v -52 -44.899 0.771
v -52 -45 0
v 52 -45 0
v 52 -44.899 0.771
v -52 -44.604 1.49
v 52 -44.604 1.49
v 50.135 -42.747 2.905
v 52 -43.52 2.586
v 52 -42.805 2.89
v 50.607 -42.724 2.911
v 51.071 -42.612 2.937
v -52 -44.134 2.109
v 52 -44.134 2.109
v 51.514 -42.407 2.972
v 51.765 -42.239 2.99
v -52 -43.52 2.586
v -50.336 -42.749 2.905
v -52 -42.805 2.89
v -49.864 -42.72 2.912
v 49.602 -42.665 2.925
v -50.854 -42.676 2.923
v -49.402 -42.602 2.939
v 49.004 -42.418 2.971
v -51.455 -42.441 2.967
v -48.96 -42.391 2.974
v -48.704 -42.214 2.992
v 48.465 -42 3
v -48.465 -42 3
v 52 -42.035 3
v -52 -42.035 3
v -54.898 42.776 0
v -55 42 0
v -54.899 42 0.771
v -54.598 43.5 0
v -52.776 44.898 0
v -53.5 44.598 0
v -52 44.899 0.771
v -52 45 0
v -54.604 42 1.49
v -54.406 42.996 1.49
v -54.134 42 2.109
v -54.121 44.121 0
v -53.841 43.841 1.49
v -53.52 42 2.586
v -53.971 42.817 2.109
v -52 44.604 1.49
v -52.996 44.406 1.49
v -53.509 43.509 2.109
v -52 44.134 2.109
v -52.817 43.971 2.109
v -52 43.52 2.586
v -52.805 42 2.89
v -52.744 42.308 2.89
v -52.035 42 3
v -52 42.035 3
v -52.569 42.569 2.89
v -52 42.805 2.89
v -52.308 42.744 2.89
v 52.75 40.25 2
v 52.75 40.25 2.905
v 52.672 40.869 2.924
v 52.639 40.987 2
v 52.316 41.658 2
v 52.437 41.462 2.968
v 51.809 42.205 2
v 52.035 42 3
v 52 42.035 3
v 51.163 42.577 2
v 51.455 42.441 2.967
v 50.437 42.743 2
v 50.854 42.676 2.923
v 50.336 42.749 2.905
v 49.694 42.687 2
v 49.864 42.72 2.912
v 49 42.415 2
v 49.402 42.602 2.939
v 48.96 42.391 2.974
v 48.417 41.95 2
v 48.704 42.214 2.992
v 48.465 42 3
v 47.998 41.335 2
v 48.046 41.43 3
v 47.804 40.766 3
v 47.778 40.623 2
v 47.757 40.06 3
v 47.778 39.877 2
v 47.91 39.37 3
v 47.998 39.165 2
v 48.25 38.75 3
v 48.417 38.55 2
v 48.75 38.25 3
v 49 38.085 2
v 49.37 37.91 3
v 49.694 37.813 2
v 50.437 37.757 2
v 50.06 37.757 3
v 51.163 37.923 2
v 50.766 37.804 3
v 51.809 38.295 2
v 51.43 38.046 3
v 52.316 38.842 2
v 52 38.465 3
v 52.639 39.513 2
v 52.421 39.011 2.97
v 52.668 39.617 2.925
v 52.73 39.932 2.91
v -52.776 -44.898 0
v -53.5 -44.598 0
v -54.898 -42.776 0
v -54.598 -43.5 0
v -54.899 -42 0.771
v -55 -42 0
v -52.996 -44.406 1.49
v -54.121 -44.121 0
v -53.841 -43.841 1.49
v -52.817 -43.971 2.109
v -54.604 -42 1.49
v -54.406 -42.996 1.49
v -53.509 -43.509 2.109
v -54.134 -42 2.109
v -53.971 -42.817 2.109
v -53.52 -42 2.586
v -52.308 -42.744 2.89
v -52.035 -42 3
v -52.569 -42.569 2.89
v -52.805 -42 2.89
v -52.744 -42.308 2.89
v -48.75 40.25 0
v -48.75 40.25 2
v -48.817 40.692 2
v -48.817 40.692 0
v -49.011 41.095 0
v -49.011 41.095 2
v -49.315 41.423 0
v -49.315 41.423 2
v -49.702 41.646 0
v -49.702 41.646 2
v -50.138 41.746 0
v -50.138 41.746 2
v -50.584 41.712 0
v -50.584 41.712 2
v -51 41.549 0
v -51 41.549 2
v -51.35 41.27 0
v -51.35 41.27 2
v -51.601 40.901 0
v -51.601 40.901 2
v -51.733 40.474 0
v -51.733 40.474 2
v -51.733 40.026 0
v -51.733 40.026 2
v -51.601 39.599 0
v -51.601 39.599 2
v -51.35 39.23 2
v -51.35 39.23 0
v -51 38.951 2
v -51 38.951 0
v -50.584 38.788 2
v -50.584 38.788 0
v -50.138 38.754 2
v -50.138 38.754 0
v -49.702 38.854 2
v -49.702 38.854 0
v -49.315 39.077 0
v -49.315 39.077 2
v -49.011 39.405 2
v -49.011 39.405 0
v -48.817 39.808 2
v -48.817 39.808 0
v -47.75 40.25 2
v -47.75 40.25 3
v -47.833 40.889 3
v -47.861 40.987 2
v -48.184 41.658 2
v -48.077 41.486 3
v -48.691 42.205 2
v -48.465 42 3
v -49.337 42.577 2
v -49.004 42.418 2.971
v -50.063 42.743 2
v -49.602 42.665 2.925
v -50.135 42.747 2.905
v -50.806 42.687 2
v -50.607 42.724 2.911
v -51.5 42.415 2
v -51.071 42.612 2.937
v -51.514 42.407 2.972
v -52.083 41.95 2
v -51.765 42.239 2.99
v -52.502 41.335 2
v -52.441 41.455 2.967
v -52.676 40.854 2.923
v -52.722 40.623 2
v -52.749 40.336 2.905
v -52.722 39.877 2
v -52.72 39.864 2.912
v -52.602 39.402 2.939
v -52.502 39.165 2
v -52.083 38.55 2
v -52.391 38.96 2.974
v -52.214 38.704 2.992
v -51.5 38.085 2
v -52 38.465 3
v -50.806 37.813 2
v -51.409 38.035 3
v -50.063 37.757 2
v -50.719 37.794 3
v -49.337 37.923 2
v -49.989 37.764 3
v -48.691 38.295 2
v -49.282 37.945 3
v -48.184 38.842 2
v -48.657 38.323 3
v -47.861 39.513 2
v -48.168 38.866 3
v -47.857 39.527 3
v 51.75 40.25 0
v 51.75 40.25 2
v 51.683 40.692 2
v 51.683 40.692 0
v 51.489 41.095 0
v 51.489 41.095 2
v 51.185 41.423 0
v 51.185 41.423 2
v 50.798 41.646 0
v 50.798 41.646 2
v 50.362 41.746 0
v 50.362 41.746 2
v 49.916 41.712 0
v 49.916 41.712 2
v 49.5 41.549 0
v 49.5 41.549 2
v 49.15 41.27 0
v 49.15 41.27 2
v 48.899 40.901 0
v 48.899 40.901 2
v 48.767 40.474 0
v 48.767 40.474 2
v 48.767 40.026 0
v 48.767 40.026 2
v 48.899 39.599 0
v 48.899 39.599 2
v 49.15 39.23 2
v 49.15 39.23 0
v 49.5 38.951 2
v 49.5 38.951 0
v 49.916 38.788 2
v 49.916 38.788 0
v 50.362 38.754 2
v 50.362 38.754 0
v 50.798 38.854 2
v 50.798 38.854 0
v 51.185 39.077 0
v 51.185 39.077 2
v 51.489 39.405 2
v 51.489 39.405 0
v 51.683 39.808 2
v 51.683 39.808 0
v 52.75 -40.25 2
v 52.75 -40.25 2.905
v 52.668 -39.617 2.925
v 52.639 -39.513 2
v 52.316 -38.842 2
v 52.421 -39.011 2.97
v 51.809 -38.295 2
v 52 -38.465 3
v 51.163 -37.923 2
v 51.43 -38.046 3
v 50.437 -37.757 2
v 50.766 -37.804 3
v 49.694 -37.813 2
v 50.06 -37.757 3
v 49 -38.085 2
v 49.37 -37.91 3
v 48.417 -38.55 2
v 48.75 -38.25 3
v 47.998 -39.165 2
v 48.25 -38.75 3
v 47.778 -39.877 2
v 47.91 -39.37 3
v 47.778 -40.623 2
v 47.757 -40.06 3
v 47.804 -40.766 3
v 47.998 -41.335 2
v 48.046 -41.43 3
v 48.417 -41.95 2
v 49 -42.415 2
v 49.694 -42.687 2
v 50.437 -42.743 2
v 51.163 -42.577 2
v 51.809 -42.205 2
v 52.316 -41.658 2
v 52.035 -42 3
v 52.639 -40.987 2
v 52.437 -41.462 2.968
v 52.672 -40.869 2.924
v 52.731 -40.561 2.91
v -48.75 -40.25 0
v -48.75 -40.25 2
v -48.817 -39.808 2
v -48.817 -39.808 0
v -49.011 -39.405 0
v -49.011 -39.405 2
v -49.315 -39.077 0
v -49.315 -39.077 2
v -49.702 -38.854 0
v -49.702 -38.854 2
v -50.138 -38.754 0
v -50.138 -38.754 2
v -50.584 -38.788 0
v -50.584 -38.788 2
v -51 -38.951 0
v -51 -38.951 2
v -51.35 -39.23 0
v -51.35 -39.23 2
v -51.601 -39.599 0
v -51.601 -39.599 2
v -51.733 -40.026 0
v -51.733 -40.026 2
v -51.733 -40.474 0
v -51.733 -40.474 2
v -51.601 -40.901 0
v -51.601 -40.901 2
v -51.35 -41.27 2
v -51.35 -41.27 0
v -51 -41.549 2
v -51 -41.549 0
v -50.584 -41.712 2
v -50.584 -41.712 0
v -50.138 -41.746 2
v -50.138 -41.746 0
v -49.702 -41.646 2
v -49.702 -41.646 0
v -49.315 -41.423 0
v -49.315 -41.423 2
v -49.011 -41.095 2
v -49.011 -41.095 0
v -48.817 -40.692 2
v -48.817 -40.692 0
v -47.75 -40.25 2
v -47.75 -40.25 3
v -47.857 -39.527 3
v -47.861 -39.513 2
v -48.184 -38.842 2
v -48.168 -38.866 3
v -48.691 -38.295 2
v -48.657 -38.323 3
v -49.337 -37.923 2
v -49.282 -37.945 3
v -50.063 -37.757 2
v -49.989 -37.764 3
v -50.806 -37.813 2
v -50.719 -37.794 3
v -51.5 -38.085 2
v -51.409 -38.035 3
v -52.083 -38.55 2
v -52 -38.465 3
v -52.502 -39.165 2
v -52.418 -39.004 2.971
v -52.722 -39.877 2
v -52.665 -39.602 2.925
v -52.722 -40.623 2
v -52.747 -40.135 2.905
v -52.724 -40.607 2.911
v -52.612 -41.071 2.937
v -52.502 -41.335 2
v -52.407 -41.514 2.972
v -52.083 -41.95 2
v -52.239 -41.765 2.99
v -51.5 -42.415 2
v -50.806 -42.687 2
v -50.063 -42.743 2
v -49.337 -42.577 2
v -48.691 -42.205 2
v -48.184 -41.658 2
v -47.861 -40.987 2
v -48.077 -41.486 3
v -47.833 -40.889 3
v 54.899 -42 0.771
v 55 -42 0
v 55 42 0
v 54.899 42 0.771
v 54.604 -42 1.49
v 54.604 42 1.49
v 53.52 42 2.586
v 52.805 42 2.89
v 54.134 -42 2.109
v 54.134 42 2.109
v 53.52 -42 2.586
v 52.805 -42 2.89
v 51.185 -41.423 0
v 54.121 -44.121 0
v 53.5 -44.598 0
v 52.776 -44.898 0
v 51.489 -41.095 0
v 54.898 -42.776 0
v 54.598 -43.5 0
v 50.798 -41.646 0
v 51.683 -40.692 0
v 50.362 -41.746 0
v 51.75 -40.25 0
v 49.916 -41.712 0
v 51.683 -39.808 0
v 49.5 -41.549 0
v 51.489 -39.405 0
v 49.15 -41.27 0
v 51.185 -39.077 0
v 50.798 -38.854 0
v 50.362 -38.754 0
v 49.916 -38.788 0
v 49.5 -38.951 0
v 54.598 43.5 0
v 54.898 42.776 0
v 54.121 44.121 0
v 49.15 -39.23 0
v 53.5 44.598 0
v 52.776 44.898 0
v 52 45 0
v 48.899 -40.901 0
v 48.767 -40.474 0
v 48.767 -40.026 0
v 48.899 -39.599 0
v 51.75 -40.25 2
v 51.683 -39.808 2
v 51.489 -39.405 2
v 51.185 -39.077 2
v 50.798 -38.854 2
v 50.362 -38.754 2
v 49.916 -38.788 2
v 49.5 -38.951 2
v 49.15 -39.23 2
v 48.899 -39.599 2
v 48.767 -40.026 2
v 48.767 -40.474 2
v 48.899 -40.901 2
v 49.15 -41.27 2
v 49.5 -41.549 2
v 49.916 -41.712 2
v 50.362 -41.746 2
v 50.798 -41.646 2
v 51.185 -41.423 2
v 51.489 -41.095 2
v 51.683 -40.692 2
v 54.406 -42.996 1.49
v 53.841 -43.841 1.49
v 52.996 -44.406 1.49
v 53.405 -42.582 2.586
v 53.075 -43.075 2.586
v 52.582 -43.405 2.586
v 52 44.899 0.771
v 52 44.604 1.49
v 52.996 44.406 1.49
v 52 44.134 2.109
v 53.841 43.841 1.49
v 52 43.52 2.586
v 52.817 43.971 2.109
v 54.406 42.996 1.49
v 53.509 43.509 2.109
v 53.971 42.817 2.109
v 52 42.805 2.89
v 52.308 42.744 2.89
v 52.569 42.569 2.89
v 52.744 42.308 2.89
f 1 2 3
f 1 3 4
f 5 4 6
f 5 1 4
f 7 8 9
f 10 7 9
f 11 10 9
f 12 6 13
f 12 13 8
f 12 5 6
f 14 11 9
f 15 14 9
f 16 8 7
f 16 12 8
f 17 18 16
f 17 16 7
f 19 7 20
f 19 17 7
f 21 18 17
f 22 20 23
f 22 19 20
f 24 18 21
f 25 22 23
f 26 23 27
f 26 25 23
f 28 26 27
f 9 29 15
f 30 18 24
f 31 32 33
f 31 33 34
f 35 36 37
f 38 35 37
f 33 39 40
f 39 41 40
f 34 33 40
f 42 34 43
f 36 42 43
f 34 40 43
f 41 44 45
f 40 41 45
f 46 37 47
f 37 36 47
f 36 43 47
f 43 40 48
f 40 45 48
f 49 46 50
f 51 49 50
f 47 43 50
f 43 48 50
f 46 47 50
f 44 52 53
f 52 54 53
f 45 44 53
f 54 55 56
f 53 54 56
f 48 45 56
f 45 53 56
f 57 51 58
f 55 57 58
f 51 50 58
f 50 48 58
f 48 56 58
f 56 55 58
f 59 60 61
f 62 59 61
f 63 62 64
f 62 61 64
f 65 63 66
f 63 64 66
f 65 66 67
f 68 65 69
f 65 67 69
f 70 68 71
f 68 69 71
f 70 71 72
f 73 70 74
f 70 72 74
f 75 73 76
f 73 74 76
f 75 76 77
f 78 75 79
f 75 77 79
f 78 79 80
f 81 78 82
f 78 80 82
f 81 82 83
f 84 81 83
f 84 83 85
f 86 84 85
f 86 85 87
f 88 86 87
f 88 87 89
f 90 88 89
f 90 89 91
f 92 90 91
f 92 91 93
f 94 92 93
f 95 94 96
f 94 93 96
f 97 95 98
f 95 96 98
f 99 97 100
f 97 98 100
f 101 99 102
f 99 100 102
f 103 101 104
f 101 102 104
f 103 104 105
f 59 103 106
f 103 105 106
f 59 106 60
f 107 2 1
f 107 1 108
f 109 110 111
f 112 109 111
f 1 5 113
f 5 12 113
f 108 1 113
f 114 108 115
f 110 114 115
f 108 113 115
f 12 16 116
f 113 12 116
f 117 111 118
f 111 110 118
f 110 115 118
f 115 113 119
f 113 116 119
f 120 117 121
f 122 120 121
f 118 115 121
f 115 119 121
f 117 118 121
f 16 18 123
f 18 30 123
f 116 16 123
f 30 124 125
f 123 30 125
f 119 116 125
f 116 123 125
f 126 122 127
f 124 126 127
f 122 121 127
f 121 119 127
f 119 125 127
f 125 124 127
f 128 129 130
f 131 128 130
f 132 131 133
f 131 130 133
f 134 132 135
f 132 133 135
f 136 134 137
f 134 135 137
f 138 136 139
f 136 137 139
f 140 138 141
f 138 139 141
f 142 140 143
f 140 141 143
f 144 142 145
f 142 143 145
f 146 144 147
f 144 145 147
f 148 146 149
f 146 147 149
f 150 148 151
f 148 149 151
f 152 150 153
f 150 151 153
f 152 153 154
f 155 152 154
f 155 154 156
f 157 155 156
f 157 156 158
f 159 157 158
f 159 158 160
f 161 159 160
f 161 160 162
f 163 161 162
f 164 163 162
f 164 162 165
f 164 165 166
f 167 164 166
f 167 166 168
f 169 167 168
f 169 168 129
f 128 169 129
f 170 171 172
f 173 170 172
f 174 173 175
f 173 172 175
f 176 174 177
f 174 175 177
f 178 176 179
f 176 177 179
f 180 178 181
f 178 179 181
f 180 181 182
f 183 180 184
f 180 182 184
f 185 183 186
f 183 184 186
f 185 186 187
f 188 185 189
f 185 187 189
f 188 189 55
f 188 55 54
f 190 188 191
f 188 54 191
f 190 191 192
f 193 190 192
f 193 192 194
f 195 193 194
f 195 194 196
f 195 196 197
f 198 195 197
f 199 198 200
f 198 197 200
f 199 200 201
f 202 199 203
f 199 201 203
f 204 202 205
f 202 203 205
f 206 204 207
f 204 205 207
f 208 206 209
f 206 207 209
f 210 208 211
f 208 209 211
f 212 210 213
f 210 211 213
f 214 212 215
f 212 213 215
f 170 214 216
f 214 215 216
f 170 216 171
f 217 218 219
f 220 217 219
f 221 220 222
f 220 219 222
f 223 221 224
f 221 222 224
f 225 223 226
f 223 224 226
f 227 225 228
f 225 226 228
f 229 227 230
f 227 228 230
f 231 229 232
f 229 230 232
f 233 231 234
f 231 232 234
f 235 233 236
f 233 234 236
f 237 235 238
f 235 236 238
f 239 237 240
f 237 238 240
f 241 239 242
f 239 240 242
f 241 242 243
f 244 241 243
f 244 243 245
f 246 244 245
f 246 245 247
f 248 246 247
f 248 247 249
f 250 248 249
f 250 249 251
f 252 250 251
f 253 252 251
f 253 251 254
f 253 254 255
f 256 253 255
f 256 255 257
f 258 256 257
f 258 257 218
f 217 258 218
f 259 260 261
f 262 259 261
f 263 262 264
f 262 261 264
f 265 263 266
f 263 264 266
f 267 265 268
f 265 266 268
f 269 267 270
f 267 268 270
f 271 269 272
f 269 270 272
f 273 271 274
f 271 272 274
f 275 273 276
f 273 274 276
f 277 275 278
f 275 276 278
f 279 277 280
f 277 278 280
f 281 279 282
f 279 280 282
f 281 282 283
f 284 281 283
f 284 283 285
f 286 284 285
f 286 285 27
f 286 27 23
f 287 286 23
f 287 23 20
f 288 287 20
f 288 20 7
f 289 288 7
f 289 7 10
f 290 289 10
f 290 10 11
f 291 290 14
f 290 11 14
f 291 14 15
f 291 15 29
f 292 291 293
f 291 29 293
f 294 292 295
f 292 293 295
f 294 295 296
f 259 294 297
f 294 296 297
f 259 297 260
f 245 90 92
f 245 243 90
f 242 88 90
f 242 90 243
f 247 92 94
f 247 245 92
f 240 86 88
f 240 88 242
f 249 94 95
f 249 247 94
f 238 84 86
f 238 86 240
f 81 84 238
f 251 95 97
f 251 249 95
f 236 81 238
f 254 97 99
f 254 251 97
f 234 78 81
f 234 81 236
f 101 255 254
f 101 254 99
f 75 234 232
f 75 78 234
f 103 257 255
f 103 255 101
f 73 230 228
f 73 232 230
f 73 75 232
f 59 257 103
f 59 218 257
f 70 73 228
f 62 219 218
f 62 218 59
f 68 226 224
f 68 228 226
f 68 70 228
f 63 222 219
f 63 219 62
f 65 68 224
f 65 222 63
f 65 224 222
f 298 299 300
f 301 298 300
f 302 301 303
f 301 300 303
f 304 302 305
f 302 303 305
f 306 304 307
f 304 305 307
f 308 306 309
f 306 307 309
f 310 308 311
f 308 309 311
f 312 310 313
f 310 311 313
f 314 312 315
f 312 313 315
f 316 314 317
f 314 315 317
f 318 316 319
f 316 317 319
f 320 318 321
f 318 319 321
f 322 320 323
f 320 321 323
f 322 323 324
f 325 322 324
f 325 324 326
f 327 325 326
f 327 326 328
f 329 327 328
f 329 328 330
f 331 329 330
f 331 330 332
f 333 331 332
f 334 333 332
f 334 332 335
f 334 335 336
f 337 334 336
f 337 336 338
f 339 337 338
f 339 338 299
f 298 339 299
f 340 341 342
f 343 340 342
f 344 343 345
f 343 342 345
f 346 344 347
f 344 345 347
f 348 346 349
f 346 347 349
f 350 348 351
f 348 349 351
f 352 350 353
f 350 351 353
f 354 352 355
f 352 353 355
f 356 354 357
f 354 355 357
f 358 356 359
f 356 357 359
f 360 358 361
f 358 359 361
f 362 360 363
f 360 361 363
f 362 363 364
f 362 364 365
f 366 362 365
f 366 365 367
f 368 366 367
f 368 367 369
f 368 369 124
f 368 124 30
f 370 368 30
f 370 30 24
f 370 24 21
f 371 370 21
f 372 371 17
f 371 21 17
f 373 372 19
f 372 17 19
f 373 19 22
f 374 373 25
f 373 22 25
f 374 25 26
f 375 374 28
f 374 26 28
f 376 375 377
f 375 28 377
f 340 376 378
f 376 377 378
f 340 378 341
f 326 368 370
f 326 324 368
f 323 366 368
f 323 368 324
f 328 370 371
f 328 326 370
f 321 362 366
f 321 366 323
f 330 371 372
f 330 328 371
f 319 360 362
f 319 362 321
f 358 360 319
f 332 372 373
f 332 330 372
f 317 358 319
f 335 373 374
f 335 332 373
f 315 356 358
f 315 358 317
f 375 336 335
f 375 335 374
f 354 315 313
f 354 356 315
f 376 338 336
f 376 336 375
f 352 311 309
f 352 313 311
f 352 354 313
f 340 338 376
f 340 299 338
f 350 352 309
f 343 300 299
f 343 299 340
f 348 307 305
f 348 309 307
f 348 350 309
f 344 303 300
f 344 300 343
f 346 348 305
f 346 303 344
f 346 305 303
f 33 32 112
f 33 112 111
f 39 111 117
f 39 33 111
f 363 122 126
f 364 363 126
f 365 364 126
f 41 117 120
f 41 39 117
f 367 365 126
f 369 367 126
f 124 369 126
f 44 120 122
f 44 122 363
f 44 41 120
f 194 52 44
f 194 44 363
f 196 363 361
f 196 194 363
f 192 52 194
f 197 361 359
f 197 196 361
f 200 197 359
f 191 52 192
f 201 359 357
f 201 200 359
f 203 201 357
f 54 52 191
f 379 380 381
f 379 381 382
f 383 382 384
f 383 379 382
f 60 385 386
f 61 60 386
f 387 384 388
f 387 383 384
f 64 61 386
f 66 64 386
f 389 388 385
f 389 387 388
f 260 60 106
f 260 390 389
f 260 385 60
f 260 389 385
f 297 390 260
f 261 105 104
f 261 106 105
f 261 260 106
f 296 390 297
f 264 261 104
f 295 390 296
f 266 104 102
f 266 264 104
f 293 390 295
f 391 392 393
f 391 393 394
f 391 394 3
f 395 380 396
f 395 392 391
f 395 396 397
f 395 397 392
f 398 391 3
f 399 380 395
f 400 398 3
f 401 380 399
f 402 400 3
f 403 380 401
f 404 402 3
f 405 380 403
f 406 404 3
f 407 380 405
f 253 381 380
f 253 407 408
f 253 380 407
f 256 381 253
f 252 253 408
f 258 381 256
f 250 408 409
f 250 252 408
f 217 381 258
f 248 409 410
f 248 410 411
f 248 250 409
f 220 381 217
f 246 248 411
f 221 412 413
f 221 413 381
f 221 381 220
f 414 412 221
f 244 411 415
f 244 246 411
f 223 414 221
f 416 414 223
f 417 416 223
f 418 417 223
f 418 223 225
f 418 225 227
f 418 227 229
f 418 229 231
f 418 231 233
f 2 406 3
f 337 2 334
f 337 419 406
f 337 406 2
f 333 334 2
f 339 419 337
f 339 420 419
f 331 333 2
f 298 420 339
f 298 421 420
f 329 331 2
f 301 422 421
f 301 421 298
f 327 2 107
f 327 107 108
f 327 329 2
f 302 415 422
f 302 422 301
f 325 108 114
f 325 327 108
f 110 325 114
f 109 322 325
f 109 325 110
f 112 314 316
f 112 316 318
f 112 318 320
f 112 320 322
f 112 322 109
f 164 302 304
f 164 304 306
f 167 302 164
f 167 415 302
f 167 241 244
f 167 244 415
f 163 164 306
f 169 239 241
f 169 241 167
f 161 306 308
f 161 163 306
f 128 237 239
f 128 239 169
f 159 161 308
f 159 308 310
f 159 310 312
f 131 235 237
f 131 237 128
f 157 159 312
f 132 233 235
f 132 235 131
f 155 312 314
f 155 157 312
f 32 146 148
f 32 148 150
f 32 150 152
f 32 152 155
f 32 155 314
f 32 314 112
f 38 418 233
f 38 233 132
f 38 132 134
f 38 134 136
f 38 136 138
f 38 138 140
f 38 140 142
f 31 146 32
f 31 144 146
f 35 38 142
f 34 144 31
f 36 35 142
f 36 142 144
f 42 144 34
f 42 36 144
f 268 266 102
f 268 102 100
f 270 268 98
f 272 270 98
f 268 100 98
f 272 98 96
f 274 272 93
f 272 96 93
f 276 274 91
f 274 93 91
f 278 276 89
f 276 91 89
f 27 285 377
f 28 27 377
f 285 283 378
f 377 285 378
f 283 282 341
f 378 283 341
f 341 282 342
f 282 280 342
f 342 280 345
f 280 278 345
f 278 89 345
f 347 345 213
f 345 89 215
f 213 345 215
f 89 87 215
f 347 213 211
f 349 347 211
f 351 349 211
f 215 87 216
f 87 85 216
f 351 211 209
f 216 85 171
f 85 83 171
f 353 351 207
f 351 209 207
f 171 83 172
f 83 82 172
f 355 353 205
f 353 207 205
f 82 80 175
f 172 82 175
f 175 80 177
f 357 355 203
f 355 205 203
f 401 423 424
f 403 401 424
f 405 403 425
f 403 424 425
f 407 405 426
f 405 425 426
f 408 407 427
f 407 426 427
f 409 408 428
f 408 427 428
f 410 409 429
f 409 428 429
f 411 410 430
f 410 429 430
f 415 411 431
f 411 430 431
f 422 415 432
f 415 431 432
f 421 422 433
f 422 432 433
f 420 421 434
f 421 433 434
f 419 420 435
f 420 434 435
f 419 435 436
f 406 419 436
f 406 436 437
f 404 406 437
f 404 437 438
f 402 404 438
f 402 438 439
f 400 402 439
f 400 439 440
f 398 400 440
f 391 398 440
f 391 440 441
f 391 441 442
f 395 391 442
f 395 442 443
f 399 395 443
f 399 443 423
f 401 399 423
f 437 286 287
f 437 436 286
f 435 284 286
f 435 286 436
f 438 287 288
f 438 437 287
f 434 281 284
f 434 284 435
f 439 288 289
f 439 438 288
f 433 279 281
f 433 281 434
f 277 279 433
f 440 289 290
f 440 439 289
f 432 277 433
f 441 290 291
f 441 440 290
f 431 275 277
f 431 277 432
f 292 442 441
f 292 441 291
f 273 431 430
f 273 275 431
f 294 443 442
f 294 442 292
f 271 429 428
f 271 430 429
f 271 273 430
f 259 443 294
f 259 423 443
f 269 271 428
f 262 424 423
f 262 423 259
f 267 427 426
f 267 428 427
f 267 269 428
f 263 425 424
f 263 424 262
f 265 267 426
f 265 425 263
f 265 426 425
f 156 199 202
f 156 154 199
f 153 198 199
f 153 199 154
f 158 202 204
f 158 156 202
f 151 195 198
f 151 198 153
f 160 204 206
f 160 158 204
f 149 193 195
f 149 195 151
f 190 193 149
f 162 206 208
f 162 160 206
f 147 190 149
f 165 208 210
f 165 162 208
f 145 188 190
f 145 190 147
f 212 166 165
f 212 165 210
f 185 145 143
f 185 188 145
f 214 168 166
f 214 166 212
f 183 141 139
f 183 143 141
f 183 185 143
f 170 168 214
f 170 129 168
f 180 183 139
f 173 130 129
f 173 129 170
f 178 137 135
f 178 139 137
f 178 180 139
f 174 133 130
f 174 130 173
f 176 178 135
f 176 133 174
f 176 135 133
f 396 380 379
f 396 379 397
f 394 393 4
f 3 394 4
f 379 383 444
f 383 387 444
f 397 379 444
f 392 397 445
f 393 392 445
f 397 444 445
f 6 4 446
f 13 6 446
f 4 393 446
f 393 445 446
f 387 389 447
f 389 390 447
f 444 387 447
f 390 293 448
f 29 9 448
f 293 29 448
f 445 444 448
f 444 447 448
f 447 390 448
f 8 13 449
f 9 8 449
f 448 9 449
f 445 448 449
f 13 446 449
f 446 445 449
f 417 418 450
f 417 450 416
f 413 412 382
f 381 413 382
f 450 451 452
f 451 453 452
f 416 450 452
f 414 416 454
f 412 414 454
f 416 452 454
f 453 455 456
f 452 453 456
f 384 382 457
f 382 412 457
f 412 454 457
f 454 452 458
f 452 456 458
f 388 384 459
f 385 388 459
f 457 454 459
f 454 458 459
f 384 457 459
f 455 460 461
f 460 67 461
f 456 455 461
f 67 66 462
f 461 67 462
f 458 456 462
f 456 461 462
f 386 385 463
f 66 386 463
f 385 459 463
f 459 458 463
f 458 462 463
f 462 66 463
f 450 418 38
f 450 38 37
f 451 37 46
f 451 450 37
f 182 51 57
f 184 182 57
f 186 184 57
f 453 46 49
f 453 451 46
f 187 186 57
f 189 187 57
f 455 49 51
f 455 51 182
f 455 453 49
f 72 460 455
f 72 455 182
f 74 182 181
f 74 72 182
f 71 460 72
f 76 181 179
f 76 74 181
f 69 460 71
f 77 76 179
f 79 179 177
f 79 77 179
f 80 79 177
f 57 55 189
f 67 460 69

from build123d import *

# Parameters (mm, degrees)
BOSS_EXTRUDE1_DEPTH = 3
FILLET3_R           = 3
SKETCH2_R           = 1.5
CUT_EXTRUDE1_DEPTH  = 72.126647608
SKETCH3_R           = 2.5
CUT_EXTRUDE2_DEPTH  = 1


with BuildPart() as part:
    # Sketch1 → Boss-Extrude1 (new body)
    with BuildSketch(Plane.XY):
        with BuildLine():
            Line((52, -45), (-52, -45))
            ThreePointArc((-52, -45), (-54.121320344, -44.121320344), (-55, -42))
            Line((-55, -42), (-55, 42))
            ThreePointArc((-55, 42), (-54.121320344, 44.121320344), (-52, 45))
            Line((-52, 45), (52, 45))
            ThreePointArc((52, 45), (54.121320344, 44.121320344), (55, 42))
            Line((55, 42), (55, -42))
            ThreePointArc((55, -42), (54.121320344, -44.121320344), (52, -45))
        make_face()
    extrude(amount=BOSS_EXTRUDE1_DEPTH)

    # Fillet3
    fillet3_edges = [part.edges().sort_by_distance(p)[0] for p in [
        (0, -45, 3),
        (-54.121320344, -44.121320344, 3),
        (-55, 0, 3),
        (-54.121320344, 44.121320344, 3),
        (0, 45, 3),
        (54.121320344, 44.121320344, 3),
        (55, 0, 3),
        (54.121320344, -44.121320344, 3),
    ]]
    fillet(fillet3_edges, radius=FILLET3_R - 0.0001)  # a hair under: the kernel refuses the full size

    # Sketch2 → Cut-Extrude1 (cut, through all)
    with BuildSketch(Plane.XY.offset(3)):
        with Locations((-50.25, 40.25)):
            Circle(SKETCH2_R)
        with Locations((50.25, 40.25)):
            Circle(SKETCH2_R)
        with Locations((-50.25, -40.25)):
            Circle(SKETCH2_R)
        with Locations((50.25, -40.25)):
            Circle(SKETCH2_R)
    extrude(amount=-CUT_EXTRUDE1_DEPTH, mode=Mode.SUBTRACT)

    # Sketch3 → Cut-Extrude2 (cut)
    with BuildSketch(Plane.XY.offset(3)):
        with Locations((-50.25, 40.25)):
            Circle(SKETCH3_R)
        with Locations((50.25, 40.25)):
            Circle(SKETCH3_R)
        with Locations((-50.25, -40.25)):
            Circle(SKETCH3_R)
        with Locations((50.25, -40.25)):
            Circle(SKETCH3_R)
    extrude(amount=-CUT_EXTRUDE2_DEPTH, mode=Mode.SUBTRACT)


solid = part.part
